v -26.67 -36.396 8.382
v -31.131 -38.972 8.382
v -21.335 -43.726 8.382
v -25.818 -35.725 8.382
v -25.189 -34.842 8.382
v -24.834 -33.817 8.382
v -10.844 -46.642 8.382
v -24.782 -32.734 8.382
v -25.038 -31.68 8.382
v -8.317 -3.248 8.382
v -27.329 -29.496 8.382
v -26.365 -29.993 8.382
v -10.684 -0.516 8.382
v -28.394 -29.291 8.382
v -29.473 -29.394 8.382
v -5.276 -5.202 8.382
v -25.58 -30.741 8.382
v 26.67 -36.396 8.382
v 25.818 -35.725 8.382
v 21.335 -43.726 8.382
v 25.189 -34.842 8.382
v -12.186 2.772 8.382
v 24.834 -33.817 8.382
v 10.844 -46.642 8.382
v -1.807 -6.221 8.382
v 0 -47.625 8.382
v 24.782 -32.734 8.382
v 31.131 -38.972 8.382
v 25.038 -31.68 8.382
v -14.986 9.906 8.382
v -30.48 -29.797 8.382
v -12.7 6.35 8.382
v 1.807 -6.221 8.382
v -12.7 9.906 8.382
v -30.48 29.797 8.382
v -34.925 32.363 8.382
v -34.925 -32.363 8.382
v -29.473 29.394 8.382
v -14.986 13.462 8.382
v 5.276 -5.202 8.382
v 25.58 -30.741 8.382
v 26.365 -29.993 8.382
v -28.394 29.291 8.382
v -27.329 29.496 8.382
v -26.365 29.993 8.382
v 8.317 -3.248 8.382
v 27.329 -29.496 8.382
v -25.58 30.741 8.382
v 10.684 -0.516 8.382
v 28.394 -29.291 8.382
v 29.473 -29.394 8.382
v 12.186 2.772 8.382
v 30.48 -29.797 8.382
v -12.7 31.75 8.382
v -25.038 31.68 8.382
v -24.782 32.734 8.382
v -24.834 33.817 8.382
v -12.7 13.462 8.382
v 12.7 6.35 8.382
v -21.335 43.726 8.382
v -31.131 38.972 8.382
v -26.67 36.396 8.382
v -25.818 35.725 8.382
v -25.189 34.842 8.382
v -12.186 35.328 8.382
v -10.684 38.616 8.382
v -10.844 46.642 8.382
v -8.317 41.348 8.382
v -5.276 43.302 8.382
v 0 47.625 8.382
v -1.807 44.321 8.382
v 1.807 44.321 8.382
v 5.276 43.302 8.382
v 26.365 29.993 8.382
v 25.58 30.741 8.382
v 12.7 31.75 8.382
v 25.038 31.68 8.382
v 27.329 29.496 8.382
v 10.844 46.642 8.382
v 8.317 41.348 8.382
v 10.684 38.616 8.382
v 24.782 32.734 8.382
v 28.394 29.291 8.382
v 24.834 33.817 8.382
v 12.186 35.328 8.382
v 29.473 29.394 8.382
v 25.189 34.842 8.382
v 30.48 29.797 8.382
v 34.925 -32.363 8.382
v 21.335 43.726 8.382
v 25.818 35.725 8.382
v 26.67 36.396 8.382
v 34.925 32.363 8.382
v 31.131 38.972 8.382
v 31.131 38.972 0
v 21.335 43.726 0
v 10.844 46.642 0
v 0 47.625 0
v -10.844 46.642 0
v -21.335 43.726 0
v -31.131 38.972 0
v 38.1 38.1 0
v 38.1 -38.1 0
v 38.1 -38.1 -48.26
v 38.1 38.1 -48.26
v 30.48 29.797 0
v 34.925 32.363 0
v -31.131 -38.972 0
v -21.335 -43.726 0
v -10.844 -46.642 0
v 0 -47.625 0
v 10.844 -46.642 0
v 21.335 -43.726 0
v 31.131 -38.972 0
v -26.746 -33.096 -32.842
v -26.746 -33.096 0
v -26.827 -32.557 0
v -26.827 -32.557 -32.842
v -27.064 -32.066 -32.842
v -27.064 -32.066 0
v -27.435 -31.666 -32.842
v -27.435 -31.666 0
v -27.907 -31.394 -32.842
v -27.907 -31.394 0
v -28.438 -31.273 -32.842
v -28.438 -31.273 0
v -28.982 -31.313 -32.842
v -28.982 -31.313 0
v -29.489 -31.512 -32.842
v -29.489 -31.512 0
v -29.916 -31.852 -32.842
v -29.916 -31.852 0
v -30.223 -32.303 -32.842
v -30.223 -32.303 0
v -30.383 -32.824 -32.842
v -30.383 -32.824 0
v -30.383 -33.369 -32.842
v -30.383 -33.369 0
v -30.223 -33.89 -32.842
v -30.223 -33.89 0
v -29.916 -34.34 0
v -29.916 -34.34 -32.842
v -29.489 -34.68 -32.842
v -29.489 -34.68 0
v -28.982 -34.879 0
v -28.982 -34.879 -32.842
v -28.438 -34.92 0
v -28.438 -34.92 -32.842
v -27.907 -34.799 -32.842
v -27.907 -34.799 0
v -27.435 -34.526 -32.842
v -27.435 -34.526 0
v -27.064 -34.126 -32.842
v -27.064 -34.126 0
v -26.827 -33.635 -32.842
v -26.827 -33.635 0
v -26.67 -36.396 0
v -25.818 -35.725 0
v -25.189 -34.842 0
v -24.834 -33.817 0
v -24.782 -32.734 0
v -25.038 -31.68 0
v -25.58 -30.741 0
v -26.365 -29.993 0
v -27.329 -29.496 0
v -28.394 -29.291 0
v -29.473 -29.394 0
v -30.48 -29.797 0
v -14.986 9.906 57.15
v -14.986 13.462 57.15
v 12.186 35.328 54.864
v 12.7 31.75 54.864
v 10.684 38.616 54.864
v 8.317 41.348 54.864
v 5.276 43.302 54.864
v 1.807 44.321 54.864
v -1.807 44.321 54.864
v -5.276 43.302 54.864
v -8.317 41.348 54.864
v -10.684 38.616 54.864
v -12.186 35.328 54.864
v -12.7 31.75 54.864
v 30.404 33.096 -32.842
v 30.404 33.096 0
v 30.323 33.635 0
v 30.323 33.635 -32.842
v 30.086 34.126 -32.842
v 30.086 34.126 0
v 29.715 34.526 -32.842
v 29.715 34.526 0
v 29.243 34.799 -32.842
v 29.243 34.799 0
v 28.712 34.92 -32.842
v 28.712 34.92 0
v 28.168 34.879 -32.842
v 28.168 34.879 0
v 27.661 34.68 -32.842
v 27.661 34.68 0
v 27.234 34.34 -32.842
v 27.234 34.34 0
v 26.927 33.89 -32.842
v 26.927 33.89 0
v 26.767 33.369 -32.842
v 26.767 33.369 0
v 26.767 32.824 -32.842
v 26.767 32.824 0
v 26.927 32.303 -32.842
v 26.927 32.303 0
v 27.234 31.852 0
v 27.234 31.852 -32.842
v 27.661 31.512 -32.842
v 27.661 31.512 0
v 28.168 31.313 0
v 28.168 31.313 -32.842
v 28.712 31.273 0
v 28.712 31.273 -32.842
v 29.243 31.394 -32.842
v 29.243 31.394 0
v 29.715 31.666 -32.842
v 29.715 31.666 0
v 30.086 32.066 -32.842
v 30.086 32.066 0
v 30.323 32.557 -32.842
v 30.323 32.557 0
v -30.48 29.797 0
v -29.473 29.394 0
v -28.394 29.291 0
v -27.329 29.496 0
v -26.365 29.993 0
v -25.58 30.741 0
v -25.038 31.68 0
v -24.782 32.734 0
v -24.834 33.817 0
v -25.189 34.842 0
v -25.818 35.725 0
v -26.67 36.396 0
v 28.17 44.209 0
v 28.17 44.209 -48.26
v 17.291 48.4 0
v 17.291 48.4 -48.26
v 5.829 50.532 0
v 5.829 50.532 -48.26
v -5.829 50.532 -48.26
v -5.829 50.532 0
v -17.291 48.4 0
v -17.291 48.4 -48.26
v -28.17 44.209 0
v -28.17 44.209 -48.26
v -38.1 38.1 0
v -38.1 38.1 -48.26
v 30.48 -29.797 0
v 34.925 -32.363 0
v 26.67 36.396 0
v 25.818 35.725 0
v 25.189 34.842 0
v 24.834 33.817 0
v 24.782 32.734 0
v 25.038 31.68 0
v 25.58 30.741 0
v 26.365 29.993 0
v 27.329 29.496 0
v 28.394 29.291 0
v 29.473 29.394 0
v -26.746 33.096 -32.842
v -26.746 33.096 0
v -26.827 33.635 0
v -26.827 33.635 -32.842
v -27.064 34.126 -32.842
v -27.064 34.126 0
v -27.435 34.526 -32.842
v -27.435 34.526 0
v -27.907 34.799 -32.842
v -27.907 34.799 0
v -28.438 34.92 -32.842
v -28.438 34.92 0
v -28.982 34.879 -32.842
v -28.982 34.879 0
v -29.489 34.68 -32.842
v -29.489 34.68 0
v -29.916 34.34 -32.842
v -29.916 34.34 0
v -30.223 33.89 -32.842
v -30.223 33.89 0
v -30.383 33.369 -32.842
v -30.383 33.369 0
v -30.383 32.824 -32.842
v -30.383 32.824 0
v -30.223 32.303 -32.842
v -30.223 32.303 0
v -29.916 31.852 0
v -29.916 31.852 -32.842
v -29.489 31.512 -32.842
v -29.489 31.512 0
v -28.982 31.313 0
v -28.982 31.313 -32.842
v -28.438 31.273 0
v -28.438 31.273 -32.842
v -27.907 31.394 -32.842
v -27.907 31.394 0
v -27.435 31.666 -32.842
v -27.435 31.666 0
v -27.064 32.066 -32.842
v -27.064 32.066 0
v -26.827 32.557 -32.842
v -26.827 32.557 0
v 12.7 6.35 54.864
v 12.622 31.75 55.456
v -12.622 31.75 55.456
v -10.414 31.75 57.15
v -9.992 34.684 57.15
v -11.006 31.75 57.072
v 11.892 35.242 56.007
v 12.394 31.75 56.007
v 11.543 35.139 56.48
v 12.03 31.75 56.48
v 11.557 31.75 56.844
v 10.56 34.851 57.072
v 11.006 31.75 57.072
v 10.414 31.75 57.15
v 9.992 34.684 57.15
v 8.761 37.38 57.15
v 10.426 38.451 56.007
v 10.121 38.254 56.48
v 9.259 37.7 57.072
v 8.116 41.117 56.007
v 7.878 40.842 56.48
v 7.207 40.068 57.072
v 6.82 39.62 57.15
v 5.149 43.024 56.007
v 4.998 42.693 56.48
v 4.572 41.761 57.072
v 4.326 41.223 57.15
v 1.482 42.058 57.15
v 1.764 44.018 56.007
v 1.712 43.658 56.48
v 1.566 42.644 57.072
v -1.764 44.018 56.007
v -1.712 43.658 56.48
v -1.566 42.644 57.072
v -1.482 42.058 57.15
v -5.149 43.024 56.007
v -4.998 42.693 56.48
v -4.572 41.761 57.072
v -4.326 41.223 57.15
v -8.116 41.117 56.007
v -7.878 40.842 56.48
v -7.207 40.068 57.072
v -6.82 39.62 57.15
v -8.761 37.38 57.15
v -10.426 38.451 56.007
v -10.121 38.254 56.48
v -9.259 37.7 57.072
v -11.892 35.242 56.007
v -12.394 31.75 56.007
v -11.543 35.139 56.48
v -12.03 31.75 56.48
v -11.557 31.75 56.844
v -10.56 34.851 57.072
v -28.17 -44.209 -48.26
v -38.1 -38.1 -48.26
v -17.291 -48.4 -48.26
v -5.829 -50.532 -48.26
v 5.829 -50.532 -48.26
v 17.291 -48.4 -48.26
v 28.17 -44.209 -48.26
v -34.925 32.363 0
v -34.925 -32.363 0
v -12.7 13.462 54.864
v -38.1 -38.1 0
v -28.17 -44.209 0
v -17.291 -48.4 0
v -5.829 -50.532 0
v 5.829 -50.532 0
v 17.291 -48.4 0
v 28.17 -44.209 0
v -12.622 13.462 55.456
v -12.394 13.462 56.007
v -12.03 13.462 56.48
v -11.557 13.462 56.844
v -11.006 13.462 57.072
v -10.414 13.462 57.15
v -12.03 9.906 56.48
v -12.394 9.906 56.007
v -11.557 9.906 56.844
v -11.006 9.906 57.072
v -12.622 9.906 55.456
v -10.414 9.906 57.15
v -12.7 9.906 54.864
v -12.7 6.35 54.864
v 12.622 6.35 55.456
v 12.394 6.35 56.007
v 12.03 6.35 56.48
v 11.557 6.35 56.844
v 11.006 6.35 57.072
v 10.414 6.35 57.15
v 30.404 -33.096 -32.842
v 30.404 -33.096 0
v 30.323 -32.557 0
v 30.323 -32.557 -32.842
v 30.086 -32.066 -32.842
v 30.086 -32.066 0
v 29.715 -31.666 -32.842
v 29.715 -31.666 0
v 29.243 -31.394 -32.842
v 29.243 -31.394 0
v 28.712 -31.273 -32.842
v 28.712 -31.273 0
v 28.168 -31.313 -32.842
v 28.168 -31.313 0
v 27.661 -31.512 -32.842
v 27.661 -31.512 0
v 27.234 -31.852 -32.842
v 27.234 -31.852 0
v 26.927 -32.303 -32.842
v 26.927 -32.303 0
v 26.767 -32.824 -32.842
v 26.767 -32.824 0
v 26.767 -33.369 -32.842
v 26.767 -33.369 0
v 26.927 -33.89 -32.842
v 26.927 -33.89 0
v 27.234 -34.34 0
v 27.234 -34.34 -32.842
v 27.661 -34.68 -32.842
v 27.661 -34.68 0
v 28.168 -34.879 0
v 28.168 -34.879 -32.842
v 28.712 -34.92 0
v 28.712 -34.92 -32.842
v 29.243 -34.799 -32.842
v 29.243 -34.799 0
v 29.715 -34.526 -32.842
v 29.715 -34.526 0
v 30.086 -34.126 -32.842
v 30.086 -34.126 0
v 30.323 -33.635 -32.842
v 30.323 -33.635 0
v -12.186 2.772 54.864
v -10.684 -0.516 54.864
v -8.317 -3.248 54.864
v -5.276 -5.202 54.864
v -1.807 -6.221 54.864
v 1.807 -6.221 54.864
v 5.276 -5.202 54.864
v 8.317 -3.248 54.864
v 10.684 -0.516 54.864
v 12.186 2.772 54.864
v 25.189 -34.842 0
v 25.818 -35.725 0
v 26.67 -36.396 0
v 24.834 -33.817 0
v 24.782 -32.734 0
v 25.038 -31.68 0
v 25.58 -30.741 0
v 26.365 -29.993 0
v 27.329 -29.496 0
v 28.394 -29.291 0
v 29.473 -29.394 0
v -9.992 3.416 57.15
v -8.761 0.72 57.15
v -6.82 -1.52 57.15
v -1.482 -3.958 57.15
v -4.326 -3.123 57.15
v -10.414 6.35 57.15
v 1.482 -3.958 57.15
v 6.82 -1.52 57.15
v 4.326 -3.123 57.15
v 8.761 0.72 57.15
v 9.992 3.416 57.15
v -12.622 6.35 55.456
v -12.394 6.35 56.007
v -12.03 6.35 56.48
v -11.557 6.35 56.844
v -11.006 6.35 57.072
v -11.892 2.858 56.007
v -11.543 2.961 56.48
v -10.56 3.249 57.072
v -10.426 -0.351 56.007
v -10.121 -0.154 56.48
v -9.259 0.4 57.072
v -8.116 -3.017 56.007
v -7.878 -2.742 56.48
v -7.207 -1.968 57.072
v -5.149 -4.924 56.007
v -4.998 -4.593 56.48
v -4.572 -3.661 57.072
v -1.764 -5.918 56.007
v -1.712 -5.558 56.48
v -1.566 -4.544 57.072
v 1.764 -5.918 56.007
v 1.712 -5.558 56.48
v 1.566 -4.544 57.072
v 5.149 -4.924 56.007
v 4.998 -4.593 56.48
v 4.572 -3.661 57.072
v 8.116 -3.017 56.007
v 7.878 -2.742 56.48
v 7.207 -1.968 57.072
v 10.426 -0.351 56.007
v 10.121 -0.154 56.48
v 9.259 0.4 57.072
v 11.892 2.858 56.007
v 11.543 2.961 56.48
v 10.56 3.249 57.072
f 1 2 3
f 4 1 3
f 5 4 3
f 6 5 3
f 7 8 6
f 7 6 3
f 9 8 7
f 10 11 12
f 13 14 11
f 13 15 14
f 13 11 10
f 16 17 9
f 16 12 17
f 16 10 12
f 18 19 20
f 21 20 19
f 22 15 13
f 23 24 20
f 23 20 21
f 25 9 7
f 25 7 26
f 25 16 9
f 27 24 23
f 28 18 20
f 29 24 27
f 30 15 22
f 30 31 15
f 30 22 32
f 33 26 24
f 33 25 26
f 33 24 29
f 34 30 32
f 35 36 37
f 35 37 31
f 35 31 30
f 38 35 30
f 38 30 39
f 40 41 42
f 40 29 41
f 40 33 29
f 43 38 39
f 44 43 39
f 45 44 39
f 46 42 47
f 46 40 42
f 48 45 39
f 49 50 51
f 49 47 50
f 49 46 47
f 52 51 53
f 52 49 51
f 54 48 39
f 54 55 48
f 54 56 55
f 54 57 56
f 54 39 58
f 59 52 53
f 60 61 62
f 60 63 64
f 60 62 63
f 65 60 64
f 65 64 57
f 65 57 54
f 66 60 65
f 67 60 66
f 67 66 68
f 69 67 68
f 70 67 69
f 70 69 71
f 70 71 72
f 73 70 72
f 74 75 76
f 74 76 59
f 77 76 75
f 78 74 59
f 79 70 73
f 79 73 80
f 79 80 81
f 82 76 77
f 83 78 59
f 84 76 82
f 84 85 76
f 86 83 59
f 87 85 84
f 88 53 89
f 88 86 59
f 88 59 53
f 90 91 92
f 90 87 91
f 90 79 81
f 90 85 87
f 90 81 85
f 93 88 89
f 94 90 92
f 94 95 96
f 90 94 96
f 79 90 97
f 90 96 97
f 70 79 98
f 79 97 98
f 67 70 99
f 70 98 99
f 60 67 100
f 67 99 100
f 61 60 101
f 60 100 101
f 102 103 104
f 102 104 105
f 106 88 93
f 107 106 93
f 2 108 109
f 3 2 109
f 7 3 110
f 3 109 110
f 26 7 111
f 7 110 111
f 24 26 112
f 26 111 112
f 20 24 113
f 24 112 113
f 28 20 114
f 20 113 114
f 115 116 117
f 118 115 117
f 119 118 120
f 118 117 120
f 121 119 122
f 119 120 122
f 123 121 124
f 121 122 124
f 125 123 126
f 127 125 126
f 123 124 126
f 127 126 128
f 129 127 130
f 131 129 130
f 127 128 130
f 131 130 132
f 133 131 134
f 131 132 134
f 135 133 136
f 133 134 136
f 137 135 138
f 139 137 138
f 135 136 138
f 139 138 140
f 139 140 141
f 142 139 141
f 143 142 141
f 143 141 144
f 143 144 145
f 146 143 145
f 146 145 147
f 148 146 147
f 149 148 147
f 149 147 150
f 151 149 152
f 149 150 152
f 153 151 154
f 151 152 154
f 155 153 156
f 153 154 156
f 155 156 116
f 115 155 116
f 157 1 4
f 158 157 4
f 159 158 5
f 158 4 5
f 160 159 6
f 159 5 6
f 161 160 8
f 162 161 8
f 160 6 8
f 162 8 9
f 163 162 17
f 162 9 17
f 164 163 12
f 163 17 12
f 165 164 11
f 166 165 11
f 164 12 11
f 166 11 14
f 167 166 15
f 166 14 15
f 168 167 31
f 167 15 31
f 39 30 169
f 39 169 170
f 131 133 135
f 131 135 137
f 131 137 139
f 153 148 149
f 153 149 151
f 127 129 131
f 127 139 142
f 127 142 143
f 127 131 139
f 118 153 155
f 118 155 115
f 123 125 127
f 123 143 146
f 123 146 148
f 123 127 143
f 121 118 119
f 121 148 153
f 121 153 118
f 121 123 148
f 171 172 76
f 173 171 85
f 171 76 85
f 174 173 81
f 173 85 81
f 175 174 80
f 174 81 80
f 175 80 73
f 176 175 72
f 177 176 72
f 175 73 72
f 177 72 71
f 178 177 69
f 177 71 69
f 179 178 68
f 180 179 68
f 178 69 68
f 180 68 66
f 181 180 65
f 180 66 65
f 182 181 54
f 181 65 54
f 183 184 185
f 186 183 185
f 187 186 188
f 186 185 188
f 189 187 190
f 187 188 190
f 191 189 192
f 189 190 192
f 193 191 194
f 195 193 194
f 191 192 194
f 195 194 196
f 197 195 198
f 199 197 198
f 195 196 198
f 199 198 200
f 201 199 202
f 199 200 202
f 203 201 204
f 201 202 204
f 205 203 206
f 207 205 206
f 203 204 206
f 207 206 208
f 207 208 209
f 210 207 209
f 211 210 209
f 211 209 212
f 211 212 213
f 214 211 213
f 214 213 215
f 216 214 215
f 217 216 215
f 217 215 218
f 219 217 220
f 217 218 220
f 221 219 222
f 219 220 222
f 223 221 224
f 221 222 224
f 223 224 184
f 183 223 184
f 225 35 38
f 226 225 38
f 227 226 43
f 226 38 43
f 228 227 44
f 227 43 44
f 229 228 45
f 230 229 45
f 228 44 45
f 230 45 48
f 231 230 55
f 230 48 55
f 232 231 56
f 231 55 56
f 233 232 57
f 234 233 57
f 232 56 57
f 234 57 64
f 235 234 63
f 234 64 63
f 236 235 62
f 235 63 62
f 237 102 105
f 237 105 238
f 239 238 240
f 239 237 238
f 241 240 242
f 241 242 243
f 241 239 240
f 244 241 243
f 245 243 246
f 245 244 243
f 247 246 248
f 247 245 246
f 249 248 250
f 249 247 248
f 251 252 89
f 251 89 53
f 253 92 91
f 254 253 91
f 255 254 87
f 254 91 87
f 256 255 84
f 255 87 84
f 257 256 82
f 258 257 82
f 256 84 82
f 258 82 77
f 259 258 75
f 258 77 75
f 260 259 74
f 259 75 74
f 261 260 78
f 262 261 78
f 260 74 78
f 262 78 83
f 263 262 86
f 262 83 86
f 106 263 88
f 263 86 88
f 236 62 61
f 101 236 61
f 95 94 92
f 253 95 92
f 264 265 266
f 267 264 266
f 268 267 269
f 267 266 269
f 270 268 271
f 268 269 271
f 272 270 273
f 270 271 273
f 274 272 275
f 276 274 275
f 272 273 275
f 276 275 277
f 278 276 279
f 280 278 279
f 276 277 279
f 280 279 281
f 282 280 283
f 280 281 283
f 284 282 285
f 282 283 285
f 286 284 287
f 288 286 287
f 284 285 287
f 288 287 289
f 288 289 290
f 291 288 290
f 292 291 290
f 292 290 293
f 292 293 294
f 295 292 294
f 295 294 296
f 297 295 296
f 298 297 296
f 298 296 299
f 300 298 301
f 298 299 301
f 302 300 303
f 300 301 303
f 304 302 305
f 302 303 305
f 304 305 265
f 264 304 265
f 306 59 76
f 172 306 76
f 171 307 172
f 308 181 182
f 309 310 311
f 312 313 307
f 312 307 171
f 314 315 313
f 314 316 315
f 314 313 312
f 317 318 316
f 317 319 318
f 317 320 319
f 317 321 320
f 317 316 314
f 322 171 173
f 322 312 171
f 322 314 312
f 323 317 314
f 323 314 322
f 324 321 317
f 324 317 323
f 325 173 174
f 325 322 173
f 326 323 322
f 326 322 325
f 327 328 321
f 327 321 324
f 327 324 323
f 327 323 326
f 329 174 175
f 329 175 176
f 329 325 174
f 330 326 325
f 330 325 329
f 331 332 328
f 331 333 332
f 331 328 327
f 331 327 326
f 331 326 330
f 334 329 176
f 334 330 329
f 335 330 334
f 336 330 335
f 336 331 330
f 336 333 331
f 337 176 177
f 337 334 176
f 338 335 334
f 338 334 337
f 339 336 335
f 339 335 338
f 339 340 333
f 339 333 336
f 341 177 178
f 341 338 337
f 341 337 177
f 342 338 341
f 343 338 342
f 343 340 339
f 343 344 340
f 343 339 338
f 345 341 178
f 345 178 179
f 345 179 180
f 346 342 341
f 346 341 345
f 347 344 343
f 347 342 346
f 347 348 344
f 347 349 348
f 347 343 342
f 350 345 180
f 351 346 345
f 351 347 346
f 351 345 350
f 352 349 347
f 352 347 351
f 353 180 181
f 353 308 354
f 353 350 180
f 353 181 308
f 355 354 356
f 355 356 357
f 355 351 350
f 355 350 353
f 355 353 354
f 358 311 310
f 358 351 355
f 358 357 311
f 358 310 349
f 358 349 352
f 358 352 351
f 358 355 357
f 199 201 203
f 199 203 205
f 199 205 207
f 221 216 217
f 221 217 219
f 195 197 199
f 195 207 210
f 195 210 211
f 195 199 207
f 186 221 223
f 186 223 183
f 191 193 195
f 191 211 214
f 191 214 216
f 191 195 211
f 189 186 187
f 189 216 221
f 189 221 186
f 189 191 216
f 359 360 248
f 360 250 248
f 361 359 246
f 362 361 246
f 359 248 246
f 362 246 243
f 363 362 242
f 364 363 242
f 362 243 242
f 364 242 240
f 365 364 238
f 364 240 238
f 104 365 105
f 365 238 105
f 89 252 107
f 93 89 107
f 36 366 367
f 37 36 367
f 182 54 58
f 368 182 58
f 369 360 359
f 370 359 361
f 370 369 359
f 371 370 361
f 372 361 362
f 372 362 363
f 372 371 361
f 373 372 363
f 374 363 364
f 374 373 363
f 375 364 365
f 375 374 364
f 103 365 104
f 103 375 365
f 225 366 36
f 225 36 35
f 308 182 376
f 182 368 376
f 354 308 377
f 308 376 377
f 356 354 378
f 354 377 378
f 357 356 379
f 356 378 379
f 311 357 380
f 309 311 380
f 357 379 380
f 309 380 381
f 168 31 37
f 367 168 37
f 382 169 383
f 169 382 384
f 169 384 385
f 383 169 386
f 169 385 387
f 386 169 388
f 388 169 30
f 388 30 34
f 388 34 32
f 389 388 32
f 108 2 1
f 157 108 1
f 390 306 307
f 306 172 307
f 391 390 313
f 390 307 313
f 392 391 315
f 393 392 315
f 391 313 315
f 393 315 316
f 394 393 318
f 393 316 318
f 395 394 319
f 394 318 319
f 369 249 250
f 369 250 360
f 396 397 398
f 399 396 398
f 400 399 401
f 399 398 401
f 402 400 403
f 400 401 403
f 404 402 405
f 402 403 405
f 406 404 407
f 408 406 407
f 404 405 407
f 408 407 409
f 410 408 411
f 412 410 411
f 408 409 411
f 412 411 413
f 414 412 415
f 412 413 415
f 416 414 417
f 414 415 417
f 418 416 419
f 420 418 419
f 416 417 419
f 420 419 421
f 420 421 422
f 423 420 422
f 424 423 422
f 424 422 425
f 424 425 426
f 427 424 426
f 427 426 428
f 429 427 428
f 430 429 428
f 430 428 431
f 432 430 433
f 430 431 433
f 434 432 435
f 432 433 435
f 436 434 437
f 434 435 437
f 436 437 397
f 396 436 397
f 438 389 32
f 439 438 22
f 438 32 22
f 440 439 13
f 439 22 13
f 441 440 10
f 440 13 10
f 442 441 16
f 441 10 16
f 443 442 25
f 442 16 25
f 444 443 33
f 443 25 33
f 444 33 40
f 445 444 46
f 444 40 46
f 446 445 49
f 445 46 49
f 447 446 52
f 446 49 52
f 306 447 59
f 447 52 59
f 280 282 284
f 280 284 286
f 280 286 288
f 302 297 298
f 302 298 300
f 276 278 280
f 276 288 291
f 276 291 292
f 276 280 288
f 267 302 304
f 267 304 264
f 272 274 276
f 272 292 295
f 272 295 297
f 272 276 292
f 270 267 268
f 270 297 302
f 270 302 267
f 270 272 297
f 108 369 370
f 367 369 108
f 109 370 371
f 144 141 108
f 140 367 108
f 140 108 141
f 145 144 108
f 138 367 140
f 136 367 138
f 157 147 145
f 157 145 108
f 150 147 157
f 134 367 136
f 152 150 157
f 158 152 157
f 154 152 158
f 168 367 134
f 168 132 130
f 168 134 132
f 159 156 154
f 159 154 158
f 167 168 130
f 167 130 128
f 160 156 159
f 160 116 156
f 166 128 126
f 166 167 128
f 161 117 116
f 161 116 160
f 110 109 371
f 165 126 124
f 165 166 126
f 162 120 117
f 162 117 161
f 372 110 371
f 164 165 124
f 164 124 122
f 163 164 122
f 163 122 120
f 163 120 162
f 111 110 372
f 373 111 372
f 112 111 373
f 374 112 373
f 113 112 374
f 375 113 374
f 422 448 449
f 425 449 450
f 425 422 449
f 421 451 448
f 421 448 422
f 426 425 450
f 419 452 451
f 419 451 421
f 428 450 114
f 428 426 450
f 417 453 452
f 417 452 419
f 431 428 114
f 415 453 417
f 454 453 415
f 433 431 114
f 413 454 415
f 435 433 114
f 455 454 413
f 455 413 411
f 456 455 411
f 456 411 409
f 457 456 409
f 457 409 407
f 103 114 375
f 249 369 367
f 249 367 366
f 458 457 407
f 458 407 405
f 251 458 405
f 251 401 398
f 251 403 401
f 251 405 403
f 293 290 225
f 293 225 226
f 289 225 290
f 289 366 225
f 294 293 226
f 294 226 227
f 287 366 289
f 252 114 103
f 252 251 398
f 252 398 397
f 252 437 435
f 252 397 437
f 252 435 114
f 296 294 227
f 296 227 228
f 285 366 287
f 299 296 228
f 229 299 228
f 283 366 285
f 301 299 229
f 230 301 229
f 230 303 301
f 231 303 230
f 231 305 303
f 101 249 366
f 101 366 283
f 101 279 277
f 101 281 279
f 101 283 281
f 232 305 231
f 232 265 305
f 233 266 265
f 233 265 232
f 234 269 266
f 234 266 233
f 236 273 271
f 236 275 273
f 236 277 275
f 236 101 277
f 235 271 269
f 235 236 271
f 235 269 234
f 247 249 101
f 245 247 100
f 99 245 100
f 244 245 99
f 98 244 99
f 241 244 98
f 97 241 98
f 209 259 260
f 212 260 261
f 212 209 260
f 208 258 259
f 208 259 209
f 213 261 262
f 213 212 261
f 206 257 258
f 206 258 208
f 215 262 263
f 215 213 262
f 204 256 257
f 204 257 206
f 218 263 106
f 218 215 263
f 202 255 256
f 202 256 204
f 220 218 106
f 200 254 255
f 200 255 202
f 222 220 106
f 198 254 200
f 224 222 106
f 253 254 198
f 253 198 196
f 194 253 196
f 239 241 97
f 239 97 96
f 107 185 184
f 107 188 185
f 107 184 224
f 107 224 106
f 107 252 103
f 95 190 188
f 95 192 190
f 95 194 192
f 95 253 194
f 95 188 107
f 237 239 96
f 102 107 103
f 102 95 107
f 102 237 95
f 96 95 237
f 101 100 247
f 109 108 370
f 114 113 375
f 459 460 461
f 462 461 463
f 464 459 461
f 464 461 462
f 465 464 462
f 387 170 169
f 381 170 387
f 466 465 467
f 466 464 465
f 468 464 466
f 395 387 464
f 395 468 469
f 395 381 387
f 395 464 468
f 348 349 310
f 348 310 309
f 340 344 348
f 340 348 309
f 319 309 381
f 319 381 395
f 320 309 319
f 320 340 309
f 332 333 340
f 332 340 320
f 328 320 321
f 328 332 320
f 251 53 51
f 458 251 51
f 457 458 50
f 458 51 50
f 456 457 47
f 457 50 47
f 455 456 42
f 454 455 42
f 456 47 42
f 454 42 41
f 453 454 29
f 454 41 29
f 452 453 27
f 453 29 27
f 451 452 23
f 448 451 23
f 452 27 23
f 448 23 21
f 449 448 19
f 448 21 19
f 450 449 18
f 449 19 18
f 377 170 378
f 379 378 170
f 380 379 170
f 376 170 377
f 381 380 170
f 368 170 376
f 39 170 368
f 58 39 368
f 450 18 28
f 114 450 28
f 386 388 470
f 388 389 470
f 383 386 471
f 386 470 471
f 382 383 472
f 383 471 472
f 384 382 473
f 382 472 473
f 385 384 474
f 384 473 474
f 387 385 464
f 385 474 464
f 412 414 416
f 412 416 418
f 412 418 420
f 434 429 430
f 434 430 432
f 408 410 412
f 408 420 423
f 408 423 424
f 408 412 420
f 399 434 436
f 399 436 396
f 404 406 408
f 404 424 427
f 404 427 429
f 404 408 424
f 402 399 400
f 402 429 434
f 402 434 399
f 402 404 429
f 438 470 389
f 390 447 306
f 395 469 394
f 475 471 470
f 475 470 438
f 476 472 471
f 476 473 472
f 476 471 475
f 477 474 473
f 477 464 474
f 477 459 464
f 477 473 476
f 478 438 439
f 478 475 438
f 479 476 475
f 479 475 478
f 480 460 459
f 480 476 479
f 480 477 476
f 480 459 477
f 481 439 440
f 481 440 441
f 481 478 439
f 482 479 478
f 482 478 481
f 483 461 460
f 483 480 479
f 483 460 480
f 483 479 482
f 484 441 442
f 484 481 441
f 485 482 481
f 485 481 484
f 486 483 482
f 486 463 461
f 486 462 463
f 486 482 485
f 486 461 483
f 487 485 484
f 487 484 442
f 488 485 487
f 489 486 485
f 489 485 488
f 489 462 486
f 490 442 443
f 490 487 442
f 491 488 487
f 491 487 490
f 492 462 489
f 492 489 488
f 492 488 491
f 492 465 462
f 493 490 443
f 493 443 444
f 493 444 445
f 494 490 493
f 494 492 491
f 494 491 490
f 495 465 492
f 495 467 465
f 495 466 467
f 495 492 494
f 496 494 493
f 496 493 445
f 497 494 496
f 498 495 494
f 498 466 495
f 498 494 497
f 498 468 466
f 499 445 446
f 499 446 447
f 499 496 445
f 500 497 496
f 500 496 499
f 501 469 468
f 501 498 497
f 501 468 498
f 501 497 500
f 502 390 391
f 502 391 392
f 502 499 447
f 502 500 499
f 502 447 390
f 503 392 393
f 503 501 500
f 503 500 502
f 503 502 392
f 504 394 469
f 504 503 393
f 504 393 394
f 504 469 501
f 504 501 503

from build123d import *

# Parameters (mm, degrees)
F1_DEPTH  = 48.26
F3_DEPTH  = 8.382
F5_DEPTH  = 8.382
F6_R      = 1.8288
F7_DEPTH  = 32.8422
F8_R      = 1.8288
F9_DEPTH  = 32.8422
F11_DEPTH = 57.15
F12_W     = 2.286
F12_H     = 3.556
F13_DEPTH = 48.768
F14_R     = 2.286


with BuildPart() as f1:
    # F0 (on Top) → F1 (new body)
    with BuildSketch(Plane.XY):
        with BuildLine():
            ThreePointArc((-38.1, -38.1), (0, -50.8), (38.1, -38.1))
            Line((38.1, -38.1), (38.1, 38.1))
            ThreePointArc((38.1, 38.1), (0, 50.8), (-38.1, 38.1))
            Line((-38.1, 38.1), (-38.1, -38.1))
        make_face()
    extrude(amount=-F1_DEPTH)

    # F2 (on face) → F3 (join)
    with BuildSketch(Plane.XY):
        with BuildLine():
            Line((-34.925, 36.486888), (-34.925, -36.486888))
            ThreePointArc((-34.925, -36.486888), (0, -47.625), (34.925, -36.486888))
            Line((34.925, -36.486888), (34.925, 36.486888))
            ThreePointArc((34.925, 36.486888), (0, 47.625), (-34.925, 36.486888))
        make_face()
    extrude(amount=F3_DEPTH)

    # F4 (on face) → F5 (cut, through all)
    with BuildSketch(Plane.XY.offset(8.382)):
        with BuildLine():
            ThreePointArc((-26.67, -36.395757), (-25.275443, -31.1912), (-30.48, -29.796643))
            Line((-30.48, -29.796643), (-52.477045, -42.496643))
            ThreePointArc((-52.477045, -42.496643), (-53.871602, -47.7012), (-48.667045, -49.095757))
            Line((-48.667045, -49.095757), (-26.67, -36.395757))
        make_face()
        with BuildLine():
            Line((52.477045, -42.496643), (30.48, -29.796643))
            ThreePointArc((30.48, -29.796643), (25.275443, -31.1912), (26.67, -36.395757))
            Line((26.67, -36.395757), (48.667045, -49.095757))
            ThreePointArc((48.667045, -49.095757), (53.871602, -47.7012), (52.477045, -42.496643))
        make_face()
        with BuildLine():
            Line((-52.477045, 42.496643), (-30.48, 29.796643))
            ThreePointArc((-30.48, 29.796643), (-25.275443, 31.1912), (-26.67, 36.395757))
            Line((-26.67, 36.395757), (-48.667045, 49.095757))
            ThreePointArc((-48.667045, 49.095757), (-53.871602, 47.7012), (-52.477045, 42.496643))
        make_face()
        with BuildLine():
            ThreePointArc((26.67, 36.395757), (25.275443, 31.1912), (30.48, 29.796643))
            Line((30.48, 29.796643), (52.477045, 42.496643))
            ThreePointArc((52.477045, 42.496643), (53.871602, 47.7012), (48.667045, 49.095757))
            Line((48.667045, 49.095757), (26.67, 36.395757))
        make_face()
    extrude(amount=-F5_DEPTH, mode=Mode.SUBTRACT)

    # F6 (on face) → F7 (cut)
    with BuildSketch(Plane.XY):
        with Locations((-28.575, 33.0962)):
            Circle(F6_R)
        with Locations((28.575, 33.0962)):
            Circle(F6_R)
        with Locations((28.575, -33.0962)):
            Circle(F6_R)
        with Locations((-28.575, -33.0962)):
            Circle(F6_R)
    extrude(amount=-F7_DEPTH, mode=Mode.SUBTRACT)

    # F8 (on face) → F9 (cut)
    with BuildSketch(Plane.XY):
        with Locations((-28.575, 33.0962)):
            Circle(F8_R)
        with Locations((28.575, 33.0962)):
            Circle(F8_R)
        with Locations((28.575, -33.0962)):
            Circle(F8_R)
        with Locations((-28.575, -33.0962)):
            Circle(F8_R)
    extrude(amount=-F9_DEPTH, mode=Mode.SUBTRACT)

    # F10 (on Top) → F11 (join)
    with BuildSketch(Plane.XY):
        with BuildLine():
            ThreePointArc((-12.7, 6.35), (0, -6.35), (12.7, 6.35))
            Line((12.7, 6.35), (12.7, 31.75))
            ThreePointArc((12.7, 31.75), (0, 44.45), (-12.7, 31.75))
            Line((-12.7, 31.75), (-12.7, 6.35))
        make_face()
    extrude(amount=F11_DEPTH)

    # F12 (on face) → F13 (join, through all)
    with BuildSketch(Plane.XY.offset(8.382)):
        with Locations((-13.843, 11.684)):
            Rectangle(F12_W, F12_H)
    extrude(amount=F13_DEPTH)

    # F14
    f14_edges = [f1.edges().sort_by_distance(p)[0] for p in [
        (12.7, 19.05, 57.15),
    ]]
    fillet(f14_edges, radius=F14_R)


solid = f1.part
